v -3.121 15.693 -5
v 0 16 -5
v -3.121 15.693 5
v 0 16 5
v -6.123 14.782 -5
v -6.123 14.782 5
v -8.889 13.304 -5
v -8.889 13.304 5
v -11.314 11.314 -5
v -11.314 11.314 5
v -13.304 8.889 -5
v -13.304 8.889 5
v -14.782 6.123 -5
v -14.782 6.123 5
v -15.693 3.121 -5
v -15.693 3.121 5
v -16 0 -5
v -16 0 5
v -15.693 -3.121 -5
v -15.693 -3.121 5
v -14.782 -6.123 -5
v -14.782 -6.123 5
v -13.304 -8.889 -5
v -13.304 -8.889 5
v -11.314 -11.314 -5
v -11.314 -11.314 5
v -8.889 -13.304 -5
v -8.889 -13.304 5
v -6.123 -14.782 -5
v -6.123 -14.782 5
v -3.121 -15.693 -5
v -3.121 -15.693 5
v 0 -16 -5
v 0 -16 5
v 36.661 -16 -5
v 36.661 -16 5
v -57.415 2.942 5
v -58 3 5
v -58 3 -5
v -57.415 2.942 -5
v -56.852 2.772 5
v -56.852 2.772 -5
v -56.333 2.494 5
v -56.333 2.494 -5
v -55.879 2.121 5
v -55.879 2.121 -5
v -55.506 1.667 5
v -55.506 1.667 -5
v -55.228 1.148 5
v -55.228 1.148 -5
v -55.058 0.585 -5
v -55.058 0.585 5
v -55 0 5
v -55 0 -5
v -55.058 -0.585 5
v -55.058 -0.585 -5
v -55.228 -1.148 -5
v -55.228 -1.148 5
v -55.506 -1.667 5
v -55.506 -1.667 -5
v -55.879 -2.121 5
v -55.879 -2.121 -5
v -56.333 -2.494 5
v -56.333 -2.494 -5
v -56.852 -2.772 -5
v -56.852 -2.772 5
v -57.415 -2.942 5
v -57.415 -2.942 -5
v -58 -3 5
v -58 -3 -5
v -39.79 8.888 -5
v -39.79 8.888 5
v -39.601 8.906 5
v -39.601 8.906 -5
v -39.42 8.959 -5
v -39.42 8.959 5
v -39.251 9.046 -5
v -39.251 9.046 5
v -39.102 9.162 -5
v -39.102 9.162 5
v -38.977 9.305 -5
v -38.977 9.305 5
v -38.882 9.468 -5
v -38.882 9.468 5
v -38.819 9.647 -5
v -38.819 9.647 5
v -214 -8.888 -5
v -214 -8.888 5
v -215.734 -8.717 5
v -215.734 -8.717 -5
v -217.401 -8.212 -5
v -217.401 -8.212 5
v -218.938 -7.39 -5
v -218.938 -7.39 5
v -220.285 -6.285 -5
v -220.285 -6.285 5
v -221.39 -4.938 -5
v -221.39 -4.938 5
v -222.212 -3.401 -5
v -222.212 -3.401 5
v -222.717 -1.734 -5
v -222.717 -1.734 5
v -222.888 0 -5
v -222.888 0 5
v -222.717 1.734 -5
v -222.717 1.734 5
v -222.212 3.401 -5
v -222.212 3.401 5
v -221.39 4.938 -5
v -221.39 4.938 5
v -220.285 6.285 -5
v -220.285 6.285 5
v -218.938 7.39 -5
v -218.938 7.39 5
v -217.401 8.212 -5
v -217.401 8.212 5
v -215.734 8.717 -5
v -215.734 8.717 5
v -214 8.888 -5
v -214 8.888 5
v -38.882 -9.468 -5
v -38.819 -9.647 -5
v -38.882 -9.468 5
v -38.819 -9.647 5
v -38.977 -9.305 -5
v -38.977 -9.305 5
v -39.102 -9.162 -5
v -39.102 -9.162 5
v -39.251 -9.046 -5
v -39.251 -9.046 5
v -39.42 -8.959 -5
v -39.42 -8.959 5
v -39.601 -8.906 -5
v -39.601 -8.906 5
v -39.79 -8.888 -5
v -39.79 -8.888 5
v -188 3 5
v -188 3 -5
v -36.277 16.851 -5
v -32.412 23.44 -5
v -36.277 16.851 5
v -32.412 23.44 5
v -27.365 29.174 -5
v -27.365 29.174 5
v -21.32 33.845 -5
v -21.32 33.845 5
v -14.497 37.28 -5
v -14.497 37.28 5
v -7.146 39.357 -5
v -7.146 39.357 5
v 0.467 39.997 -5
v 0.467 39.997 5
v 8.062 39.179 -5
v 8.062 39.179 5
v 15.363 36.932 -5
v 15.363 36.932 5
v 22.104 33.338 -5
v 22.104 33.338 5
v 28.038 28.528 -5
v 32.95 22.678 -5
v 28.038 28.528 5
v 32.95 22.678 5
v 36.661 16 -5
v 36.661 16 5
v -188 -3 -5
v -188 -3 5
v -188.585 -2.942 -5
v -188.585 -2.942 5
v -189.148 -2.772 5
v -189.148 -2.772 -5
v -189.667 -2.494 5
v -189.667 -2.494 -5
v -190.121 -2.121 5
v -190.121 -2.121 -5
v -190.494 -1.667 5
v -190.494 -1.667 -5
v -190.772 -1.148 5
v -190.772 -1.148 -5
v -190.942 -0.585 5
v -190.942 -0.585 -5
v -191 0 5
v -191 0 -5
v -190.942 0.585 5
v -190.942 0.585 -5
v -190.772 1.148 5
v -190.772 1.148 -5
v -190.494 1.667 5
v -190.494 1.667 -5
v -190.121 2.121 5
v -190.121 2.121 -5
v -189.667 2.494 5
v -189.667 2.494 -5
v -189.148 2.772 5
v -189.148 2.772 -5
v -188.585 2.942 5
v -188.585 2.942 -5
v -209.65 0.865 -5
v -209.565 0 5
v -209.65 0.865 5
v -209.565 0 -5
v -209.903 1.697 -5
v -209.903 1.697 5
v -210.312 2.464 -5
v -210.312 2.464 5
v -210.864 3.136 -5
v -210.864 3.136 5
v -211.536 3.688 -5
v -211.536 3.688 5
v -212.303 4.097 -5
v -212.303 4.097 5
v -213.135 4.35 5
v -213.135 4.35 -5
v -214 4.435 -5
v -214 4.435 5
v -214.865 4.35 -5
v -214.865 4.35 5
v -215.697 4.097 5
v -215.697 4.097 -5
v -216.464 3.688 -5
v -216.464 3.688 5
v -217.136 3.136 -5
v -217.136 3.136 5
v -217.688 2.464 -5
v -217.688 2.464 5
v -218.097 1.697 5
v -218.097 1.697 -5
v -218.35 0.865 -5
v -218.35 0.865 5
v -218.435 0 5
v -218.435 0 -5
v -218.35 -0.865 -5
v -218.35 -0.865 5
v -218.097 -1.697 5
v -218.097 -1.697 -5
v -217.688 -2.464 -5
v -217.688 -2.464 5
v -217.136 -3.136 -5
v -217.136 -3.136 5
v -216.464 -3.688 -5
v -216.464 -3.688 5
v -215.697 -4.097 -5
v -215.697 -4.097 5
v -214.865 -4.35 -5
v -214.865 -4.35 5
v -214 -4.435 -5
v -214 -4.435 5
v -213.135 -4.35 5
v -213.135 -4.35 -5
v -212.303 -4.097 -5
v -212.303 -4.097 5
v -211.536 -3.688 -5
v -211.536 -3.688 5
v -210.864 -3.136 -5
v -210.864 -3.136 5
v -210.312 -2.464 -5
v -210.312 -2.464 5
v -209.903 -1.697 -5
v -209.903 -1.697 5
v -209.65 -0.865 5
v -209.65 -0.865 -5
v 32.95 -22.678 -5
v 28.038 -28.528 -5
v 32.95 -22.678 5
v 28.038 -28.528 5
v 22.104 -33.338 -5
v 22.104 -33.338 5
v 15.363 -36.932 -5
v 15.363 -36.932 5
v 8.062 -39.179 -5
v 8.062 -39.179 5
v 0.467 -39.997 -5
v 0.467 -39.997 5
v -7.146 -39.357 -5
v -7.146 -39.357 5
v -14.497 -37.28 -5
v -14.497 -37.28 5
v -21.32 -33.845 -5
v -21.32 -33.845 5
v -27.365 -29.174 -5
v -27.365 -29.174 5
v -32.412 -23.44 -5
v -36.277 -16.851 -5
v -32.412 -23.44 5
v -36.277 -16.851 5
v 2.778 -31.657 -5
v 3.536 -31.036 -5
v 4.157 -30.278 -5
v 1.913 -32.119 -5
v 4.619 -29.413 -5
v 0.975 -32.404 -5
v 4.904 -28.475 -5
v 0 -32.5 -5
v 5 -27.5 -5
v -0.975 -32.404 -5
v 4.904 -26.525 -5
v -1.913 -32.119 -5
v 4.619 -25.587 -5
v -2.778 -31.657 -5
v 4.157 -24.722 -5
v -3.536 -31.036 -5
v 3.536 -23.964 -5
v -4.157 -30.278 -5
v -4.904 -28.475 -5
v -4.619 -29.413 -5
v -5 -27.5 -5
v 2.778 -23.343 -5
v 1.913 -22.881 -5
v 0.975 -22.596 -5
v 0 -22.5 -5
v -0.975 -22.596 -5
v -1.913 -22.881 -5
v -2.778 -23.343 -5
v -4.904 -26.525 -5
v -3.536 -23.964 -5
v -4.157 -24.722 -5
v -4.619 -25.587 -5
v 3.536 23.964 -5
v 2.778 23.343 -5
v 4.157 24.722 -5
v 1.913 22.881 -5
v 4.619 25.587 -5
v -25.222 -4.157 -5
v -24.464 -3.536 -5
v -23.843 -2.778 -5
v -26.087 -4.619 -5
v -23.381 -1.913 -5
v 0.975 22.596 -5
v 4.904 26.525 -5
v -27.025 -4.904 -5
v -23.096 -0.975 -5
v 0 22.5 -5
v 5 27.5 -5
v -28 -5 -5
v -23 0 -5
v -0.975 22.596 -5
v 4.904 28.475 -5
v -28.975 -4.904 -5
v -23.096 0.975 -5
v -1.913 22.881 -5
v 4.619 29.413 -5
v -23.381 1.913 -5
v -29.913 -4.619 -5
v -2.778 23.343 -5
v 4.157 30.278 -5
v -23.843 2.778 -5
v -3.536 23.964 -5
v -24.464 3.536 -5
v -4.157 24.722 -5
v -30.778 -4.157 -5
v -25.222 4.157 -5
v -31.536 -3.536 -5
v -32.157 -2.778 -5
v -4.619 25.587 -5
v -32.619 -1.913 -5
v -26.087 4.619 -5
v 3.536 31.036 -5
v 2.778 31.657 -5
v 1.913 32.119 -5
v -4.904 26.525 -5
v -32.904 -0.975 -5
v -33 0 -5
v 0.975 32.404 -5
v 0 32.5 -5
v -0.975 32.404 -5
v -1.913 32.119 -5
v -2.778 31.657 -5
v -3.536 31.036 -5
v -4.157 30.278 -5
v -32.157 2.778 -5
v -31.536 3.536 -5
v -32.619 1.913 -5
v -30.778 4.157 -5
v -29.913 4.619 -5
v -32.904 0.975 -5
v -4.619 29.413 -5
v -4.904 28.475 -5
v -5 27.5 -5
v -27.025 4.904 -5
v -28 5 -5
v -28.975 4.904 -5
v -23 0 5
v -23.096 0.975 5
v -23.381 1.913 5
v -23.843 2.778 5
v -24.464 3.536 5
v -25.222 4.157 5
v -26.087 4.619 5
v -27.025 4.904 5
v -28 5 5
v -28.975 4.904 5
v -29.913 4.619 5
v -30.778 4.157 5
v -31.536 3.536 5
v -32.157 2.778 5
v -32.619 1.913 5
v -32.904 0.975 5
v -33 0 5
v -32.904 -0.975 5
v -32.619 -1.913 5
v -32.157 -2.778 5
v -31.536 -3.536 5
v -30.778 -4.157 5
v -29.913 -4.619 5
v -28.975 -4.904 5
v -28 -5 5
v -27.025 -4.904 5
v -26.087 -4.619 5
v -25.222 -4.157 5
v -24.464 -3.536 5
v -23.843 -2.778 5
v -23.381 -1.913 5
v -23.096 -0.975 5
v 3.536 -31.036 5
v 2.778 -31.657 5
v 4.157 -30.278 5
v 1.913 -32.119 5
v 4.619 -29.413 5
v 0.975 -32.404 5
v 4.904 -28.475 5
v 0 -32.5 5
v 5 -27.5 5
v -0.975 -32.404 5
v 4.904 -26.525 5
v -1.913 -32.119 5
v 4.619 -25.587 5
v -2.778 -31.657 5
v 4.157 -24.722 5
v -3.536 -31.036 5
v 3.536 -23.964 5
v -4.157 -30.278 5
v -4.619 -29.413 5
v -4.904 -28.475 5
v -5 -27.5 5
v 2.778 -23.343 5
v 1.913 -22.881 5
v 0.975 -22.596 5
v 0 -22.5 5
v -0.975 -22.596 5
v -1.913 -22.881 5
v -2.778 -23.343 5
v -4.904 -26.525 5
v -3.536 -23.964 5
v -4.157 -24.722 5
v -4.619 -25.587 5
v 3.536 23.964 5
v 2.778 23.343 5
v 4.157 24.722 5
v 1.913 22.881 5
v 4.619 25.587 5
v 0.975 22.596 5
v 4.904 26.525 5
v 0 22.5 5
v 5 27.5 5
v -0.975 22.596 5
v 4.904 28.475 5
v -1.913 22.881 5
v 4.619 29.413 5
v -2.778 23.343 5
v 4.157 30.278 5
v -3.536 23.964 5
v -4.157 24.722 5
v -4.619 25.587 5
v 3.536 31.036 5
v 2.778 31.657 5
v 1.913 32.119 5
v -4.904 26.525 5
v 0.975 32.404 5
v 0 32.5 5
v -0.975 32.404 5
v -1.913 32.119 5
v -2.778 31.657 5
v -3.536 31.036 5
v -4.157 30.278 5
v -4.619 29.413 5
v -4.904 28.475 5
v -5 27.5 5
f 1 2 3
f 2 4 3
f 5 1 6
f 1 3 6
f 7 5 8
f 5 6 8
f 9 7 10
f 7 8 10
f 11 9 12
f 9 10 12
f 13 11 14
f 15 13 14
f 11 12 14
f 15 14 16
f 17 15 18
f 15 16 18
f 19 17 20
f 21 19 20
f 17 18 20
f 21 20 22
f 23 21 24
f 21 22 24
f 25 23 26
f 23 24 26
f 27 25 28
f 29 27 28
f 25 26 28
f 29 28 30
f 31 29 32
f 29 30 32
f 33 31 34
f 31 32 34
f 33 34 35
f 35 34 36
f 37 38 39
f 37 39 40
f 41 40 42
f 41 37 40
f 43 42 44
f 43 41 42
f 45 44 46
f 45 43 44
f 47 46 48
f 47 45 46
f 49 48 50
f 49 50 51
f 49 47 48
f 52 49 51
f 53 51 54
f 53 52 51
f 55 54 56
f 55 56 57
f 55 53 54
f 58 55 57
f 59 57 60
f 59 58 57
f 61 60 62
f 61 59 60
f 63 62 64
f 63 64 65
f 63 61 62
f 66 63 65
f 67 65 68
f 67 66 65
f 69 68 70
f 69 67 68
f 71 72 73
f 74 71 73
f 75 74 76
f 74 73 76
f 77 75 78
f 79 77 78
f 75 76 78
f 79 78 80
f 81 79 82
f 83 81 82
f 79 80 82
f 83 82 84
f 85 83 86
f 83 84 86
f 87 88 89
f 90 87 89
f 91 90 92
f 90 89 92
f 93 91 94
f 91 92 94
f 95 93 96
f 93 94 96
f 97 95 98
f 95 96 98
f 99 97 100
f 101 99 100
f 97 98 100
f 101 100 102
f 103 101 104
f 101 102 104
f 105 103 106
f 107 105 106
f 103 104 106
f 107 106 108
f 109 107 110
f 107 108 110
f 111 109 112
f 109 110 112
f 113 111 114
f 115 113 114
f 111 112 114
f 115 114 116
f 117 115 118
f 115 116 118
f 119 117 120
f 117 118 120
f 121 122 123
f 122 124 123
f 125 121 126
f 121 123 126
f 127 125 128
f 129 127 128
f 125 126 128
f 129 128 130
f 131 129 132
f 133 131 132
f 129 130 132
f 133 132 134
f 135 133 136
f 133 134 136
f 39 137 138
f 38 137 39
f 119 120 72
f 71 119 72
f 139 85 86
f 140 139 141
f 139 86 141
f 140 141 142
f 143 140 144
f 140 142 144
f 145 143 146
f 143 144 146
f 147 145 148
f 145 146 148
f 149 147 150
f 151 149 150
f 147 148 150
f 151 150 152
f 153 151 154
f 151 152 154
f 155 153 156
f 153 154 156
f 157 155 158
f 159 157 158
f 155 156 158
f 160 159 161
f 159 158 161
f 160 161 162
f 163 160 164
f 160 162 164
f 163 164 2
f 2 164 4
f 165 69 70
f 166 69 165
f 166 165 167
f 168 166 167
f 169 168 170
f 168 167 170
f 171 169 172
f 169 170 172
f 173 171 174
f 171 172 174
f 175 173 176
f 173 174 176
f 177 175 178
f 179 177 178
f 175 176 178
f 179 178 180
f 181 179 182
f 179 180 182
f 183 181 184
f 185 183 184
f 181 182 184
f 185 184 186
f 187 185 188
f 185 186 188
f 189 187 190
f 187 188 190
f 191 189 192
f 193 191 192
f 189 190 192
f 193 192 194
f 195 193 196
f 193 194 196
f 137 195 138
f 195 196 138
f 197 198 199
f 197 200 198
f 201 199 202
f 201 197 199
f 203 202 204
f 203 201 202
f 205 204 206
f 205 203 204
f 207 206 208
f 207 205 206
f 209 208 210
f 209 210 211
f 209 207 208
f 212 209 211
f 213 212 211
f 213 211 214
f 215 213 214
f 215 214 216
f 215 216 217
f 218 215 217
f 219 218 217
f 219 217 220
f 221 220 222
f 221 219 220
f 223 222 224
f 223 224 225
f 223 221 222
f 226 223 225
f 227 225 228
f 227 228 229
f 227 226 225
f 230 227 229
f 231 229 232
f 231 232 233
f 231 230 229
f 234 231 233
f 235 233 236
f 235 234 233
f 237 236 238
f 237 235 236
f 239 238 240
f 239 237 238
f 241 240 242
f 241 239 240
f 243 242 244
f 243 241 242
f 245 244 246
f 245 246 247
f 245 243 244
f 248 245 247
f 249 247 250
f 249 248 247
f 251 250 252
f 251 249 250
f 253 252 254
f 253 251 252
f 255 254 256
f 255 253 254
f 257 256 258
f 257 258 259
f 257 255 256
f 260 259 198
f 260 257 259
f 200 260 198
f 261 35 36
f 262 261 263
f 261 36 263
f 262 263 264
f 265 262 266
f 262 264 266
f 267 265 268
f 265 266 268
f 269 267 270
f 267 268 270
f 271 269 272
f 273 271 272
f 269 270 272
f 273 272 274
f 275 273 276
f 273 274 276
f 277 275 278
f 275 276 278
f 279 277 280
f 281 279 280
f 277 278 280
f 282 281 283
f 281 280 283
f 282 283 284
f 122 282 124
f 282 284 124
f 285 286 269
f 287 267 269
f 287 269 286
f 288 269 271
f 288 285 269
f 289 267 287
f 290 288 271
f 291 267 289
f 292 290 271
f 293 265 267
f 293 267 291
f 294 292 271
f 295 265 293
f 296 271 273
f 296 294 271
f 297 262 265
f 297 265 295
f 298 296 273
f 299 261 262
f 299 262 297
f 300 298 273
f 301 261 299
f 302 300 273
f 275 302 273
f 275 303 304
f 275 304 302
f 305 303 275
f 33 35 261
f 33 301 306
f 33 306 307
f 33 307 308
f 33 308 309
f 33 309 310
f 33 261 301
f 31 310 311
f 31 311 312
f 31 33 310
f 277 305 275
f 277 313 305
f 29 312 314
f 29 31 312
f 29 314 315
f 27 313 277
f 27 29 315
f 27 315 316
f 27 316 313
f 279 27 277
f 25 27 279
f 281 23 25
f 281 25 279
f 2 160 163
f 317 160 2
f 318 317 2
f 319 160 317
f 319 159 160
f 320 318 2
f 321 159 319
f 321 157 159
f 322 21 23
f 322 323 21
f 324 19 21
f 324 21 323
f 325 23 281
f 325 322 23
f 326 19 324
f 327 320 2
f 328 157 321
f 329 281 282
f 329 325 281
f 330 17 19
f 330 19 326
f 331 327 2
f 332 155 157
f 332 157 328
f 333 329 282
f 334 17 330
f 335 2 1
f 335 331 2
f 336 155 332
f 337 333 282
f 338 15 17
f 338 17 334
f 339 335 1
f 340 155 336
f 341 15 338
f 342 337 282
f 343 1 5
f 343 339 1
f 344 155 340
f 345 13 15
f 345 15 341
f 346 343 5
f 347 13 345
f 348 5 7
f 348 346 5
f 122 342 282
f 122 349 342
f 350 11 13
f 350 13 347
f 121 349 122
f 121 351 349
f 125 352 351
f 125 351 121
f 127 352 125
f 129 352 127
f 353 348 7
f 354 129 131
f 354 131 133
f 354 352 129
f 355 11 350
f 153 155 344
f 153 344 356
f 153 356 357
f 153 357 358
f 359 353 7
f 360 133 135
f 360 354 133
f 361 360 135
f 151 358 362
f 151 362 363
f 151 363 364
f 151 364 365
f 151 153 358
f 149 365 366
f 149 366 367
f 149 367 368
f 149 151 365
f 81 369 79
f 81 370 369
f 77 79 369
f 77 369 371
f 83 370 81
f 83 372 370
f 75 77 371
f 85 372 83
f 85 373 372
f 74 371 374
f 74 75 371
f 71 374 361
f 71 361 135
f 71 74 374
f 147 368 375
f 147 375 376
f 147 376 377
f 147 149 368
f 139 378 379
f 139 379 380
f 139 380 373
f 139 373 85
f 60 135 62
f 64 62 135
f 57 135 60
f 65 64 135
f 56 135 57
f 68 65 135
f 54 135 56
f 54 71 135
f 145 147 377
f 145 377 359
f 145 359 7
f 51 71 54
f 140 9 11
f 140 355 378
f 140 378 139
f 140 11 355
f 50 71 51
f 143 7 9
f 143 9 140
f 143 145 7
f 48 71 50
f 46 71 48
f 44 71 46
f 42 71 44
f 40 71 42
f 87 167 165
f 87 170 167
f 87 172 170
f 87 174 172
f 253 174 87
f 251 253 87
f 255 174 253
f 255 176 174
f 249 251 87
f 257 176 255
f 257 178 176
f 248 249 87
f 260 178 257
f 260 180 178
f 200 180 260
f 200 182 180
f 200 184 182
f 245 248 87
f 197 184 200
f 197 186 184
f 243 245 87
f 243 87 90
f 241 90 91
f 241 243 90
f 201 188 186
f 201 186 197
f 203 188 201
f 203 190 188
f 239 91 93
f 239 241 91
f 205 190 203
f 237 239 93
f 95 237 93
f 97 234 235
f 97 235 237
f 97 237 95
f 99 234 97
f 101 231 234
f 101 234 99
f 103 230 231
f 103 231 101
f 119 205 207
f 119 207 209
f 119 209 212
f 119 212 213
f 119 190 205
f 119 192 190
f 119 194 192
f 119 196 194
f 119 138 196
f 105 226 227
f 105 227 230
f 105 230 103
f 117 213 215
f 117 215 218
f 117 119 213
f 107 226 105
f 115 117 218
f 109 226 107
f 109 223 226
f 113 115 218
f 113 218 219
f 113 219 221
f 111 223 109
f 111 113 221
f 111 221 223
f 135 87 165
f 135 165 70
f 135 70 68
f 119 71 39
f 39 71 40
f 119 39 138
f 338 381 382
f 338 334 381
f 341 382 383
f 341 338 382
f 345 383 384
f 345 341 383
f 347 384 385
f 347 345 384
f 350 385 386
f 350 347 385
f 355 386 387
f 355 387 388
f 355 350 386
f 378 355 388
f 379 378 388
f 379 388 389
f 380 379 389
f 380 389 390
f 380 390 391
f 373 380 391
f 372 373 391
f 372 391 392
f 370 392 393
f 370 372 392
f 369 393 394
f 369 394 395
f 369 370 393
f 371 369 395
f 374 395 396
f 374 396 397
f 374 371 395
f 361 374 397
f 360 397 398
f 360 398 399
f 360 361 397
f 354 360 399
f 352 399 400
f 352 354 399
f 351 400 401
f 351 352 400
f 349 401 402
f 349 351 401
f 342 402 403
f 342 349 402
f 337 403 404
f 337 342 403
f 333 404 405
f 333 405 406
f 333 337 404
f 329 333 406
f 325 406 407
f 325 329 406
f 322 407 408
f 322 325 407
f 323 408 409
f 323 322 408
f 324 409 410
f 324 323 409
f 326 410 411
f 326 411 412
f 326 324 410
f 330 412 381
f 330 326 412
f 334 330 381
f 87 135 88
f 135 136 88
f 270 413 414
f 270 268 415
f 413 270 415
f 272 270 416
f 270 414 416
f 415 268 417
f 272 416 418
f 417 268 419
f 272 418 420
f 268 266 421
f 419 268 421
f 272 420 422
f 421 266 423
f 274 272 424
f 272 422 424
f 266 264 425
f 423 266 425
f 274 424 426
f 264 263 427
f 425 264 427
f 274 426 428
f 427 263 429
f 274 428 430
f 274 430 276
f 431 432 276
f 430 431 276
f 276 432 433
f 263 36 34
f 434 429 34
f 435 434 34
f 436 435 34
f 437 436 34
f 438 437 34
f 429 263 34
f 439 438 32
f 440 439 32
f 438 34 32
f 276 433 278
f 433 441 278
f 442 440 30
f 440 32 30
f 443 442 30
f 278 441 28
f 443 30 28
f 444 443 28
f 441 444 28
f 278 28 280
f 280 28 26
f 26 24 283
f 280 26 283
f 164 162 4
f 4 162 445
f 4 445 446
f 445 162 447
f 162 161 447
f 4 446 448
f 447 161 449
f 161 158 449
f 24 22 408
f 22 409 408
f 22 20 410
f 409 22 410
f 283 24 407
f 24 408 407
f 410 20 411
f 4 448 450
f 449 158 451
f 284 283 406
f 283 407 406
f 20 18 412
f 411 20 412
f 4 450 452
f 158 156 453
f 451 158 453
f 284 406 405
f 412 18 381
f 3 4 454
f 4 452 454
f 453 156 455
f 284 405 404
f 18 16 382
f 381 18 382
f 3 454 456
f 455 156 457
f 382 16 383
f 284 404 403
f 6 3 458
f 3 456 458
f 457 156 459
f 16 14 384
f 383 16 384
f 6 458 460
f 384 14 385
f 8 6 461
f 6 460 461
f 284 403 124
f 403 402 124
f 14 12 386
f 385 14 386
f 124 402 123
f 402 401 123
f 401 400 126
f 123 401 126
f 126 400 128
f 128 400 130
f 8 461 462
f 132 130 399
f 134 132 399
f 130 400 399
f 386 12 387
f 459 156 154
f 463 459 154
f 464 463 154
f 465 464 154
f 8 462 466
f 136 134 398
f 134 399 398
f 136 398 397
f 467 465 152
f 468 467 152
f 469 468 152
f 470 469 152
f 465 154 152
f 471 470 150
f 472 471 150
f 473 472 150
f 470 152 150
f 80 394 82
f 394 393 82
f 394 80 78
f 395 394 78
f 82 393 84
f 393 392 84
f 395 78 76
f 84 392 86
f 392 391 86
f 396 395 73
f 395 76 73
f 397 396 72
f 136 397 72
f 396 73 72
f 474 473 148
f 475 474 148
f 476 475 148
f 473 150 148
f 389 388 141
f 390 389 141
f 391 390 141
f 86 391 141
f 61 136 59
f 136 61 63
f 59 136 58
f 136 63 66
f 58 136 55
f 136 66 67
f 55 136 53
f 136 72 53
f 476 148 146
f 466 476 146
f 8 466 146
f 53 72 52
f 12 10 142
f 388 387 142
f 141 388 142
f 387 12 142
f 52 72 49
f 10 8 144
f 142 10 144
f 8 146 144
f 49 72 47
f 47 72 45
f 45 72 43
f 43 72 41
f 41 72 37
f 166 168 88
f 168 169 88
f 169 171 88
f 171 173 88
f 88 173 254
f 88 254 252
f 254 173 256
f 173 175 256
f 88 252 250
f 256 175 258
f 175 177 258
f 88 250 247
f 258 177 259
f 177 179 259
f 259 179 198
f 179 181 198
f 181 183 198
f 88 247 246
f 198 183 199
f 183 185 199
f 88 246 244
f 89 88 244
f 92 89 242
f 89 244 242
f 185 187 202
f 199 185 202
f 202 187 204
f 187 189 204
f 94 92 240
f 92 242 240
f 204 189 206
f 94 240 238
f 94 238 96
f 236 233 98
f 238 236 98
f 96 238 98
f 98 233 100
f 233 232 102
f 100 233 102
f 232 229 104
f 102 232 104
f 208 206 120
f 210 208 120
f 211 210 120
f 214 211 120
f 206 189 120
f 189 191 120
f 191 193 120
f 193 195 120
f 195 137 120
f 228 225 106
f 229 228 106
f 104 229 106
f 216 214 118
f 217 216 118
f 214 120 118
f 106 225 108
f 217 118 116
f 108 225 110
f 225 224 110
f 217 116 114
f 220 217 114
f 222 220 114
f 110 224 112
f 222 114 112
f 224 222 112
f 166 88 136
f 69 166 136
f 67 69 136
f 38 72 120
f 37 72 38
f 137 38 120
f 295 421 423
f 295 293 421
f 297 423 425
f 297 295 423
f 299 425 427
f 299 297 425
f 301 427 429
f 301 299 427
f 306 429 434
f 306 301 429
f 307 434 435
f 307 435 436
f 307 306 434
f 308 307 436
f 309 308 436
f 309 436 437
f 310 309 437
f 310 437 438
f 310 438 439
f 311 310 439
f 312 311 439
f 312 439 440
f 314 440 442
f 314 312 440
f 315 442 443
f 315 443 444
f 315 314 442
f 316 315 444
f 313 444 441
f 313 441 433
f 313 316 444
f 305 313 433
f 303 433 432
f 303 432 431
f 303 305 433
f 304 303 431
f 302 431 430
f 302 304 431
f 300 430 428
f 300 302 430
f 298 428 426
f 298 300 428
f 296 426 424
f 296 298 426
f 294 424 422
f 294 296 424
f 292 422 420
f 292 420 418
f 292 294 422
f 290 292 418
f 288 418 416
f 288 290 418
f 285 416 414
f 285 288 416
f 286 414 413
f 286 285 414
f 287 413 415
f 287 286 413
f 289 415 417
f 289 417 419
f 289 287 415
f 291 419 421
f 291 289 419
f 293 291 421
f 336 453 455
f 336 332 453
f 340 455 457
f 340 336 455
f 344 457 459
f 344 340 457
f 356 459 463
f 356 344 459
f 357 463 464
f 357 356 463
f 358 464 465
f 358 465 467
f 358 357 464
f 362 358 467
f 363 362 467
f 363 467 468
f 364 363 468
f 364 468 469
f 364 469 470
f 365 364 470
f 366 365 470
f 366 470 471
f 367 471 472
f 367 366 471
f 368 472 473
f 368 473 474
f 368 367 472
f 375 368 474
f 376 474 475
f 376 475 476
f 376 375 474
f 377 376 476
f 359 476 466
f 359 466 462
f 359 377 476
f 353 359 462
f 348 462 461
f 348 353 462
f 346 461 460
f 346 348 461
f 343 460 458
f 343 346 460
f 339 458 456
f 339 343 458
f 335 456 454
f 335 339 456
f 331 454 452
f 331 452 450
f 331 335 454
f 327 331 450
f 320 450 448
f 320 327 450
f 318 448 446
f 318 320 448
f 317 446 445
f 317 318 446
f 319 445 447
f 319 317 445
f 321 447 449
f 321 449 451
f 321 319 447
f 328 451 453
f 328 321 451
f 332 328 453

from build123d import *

# Parameters (mm, degrees)
SKETCH1_R           = 5
SKETCH1_R_2         = 4.435
BOSS_EXTRUDE1_DEPTH = 5


with BuildPart() as part:
    # Sketch1 → Boss-Extrude1 (new, symmetric)
    with BuildSketch(Plane.XY):
        with BuildLine():
            Line((36.66060556, 16), (0, 16))
            ThreePointArc((0, 16), (-16, 0), (0, -16))
            Line((0, -16), (36.66060556, -16))
            ThreePointArc((36.66060556, -16), (-3.354853263, -39.859063707), (-38.819261012, -9.647018944))
            ThreePointArc((-38.819261012, -9.647018944), (-39.173778039, -9.100420505), (-39.789742537, -8.888194417))
            Line((-39.789742537, -8.888194417), (-214, -8.888194417))
            ThreePointArc((-214, -8.888194417), (-222.888194417, 0), (-214, 8.888194417))
            Line((-214, 8.888194417), (-39.789742537, 8.888194417))
            ThreePointArc((-39.789742537, 8.888194417), (-39.173778039, 9.100420505), (-38.819261012, 9.647018944))
            ThreePointArc((-38.819261012, 9.647018944), (-3.354853263, 39.859063707), (36.66060556, 16))
        make_face()
        with Locations((0, 27.5)):
            Circle(SKETCH1_R, mode=Mode.SUBTRACT)
        with Locations((-28, 0)):
            Circle(SKETCH1_R, mode=Mode.SUBTRACT)
        with Locations((0, -27.5)):
            Circle(SKETCH1_R, mode=Mode.SUBTRACT)
        with Locations((-214, 0)):
            Circle(SKETCH1_R_2, mode=Mode.SUBTRACT)
        with BuildLine():
            Line((-188, 3), (-58, 3))
            ThreePointArc((-58, 3), (-55, 0), (-58, -3))
            Line((-58, -3), (-188, -3))
            ThreePointArc((-188, -3), (-191, 0), (-188, 3))
        make_face(mode=Mode.SUBTRACT)
    extrude(amount=BOSS_EXTRUDE1_DEPTH, both=True)


solid = part.part
